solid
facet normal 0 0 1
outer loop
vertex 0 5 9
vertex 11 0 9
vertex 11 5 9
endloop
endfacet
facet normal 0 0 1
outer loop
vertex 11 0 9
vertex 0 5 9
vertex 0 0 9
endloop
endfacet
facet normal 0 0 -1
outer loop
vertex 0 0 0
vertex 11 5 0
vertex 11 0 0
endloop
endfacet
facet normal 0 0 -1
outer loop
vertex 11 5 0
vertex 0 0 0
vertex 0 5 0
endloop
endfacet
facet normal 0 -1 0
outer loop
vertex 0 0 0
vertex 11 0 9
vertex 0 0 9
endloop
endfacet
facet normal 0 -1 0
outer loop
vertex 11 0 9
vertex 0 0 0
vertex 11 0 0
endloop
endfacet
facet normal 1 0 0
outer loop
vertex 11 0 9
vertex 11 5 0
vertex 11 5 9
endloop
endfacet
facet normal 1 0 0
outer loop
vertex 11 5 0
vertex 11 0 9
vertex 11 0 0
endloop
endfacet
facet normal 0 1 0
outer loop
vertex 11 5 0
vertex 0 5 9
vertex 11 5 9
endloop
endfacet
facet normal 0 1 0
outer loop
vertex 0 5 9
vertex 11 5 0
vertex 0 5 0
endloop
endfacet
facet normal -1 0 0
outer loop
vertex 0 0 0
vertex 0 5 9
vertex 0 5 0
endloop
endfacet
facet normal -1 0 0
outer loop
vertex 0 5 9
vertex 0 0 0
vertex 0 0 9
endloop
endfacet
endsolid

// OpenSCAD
// Generated by SolidPython 1.0.1 on 2020-07-29 00:46:55


cube(size = [11, 5, 9]);
/***********************************************
*********      SolidPython code:      **********
************************************************
 
# import packages: SolidPython
from solid import *
from solid.utils import *
from itertools import chain, combinations, permutations


class Resize:

    def __init__(self, scad_file):
        self.scad_file = scad_file
        #self.scad_file = import_scad(scad_file)
        # cone/cylinder param:
        self.r1 = 0
        self.r2 = 0
        self.h = 0
        # rectangular prism param:
        self.w = 0
        self.l = 0
        # ellipse param:
        self.r = 0

    # import OpenScad code (file name corresponds to shape)


    # classify shape + parameters
    def assign(self, param1, param2, param3):
        if self.scad_file == 'cone.scad':
            self.r1 = param1
            self.r2 = param2
            self.h = param3
        elif self.scad_file == 'cylinder.scad':
            self.r1 = param1
            self.r2 = param2
            self.h = param3
        elif self.scad_file == 'rectangularPrism.scad':
            self.h = param1
            self.l = param2
            self.w = param3
        else:
            self.r = param1
            self.h = param2

    # resize parameters
    def iterate(self):
        x = range(3, 20, 2)
        i = 1
        if self.scad_file == 'cone.scad':
            tempList = list(permutations(x, 2))
            for temp in tempList:
                param1 = temp[0]
                param2 = temp[1]
                filepath = 'produced_scad_files/' + 'cone' + str(param1) + '_' + str(param2) + '_' + '.scad'
                scad_render_to_file(cylinder(h=param1, r1=param2, r2=0), filepath)

        elif self.scad_file == 'cylinder.scad':
            tempList = list(permutations(x, 3))
            for temp in tempList:
                param1 = temp[0]
                param2 = temp[1]
                filepath = 'produced_scad_files/' + 'cylinder' + str(param1) + '_' + str(param2) + '_' + '.scad'
                scad_render_to_file(cylinder(h=param1, r1=param2, r2=param2), filepath)

        elif self.scad_file == 'rectangularPrism.scad':
            tempList = list(permutations(x, 3))
            for temp in tempList:
                param1 = temp[0]
                param2 = temp[1]
                param3 = temp[2]
                filepath = 'produced_scad_files/' + 'rectangularPrism' + str(param1) + '_' + str(param2) + '_' + str(
                    param3) + '.scad'
                scad_render_to_file(cube(size=(param1, param2, param3)), filepath)

        elif self.scad_file == 'ellipse.scad':
            tempList = list(permutations(x, 4))
            for temp in tempList:
                param1 = temp[0]
                param2 = temp[1]
                param3 = temp[2]
                param4 = temp[3]
                filepath = 'produced_scad_files/' + 'ellipse' + str(param1) + '_' + str(param2) + '_' + str(param3) + '_' + str(param4) + '.scad'
                scad_render_to_file(scale([param1, param2, param3])(sphere(r=param4)), filepath)

    def render_to_scadfile(self):
        scad_render_to_file(scad, 'example.scad') 
 
************************************************/
